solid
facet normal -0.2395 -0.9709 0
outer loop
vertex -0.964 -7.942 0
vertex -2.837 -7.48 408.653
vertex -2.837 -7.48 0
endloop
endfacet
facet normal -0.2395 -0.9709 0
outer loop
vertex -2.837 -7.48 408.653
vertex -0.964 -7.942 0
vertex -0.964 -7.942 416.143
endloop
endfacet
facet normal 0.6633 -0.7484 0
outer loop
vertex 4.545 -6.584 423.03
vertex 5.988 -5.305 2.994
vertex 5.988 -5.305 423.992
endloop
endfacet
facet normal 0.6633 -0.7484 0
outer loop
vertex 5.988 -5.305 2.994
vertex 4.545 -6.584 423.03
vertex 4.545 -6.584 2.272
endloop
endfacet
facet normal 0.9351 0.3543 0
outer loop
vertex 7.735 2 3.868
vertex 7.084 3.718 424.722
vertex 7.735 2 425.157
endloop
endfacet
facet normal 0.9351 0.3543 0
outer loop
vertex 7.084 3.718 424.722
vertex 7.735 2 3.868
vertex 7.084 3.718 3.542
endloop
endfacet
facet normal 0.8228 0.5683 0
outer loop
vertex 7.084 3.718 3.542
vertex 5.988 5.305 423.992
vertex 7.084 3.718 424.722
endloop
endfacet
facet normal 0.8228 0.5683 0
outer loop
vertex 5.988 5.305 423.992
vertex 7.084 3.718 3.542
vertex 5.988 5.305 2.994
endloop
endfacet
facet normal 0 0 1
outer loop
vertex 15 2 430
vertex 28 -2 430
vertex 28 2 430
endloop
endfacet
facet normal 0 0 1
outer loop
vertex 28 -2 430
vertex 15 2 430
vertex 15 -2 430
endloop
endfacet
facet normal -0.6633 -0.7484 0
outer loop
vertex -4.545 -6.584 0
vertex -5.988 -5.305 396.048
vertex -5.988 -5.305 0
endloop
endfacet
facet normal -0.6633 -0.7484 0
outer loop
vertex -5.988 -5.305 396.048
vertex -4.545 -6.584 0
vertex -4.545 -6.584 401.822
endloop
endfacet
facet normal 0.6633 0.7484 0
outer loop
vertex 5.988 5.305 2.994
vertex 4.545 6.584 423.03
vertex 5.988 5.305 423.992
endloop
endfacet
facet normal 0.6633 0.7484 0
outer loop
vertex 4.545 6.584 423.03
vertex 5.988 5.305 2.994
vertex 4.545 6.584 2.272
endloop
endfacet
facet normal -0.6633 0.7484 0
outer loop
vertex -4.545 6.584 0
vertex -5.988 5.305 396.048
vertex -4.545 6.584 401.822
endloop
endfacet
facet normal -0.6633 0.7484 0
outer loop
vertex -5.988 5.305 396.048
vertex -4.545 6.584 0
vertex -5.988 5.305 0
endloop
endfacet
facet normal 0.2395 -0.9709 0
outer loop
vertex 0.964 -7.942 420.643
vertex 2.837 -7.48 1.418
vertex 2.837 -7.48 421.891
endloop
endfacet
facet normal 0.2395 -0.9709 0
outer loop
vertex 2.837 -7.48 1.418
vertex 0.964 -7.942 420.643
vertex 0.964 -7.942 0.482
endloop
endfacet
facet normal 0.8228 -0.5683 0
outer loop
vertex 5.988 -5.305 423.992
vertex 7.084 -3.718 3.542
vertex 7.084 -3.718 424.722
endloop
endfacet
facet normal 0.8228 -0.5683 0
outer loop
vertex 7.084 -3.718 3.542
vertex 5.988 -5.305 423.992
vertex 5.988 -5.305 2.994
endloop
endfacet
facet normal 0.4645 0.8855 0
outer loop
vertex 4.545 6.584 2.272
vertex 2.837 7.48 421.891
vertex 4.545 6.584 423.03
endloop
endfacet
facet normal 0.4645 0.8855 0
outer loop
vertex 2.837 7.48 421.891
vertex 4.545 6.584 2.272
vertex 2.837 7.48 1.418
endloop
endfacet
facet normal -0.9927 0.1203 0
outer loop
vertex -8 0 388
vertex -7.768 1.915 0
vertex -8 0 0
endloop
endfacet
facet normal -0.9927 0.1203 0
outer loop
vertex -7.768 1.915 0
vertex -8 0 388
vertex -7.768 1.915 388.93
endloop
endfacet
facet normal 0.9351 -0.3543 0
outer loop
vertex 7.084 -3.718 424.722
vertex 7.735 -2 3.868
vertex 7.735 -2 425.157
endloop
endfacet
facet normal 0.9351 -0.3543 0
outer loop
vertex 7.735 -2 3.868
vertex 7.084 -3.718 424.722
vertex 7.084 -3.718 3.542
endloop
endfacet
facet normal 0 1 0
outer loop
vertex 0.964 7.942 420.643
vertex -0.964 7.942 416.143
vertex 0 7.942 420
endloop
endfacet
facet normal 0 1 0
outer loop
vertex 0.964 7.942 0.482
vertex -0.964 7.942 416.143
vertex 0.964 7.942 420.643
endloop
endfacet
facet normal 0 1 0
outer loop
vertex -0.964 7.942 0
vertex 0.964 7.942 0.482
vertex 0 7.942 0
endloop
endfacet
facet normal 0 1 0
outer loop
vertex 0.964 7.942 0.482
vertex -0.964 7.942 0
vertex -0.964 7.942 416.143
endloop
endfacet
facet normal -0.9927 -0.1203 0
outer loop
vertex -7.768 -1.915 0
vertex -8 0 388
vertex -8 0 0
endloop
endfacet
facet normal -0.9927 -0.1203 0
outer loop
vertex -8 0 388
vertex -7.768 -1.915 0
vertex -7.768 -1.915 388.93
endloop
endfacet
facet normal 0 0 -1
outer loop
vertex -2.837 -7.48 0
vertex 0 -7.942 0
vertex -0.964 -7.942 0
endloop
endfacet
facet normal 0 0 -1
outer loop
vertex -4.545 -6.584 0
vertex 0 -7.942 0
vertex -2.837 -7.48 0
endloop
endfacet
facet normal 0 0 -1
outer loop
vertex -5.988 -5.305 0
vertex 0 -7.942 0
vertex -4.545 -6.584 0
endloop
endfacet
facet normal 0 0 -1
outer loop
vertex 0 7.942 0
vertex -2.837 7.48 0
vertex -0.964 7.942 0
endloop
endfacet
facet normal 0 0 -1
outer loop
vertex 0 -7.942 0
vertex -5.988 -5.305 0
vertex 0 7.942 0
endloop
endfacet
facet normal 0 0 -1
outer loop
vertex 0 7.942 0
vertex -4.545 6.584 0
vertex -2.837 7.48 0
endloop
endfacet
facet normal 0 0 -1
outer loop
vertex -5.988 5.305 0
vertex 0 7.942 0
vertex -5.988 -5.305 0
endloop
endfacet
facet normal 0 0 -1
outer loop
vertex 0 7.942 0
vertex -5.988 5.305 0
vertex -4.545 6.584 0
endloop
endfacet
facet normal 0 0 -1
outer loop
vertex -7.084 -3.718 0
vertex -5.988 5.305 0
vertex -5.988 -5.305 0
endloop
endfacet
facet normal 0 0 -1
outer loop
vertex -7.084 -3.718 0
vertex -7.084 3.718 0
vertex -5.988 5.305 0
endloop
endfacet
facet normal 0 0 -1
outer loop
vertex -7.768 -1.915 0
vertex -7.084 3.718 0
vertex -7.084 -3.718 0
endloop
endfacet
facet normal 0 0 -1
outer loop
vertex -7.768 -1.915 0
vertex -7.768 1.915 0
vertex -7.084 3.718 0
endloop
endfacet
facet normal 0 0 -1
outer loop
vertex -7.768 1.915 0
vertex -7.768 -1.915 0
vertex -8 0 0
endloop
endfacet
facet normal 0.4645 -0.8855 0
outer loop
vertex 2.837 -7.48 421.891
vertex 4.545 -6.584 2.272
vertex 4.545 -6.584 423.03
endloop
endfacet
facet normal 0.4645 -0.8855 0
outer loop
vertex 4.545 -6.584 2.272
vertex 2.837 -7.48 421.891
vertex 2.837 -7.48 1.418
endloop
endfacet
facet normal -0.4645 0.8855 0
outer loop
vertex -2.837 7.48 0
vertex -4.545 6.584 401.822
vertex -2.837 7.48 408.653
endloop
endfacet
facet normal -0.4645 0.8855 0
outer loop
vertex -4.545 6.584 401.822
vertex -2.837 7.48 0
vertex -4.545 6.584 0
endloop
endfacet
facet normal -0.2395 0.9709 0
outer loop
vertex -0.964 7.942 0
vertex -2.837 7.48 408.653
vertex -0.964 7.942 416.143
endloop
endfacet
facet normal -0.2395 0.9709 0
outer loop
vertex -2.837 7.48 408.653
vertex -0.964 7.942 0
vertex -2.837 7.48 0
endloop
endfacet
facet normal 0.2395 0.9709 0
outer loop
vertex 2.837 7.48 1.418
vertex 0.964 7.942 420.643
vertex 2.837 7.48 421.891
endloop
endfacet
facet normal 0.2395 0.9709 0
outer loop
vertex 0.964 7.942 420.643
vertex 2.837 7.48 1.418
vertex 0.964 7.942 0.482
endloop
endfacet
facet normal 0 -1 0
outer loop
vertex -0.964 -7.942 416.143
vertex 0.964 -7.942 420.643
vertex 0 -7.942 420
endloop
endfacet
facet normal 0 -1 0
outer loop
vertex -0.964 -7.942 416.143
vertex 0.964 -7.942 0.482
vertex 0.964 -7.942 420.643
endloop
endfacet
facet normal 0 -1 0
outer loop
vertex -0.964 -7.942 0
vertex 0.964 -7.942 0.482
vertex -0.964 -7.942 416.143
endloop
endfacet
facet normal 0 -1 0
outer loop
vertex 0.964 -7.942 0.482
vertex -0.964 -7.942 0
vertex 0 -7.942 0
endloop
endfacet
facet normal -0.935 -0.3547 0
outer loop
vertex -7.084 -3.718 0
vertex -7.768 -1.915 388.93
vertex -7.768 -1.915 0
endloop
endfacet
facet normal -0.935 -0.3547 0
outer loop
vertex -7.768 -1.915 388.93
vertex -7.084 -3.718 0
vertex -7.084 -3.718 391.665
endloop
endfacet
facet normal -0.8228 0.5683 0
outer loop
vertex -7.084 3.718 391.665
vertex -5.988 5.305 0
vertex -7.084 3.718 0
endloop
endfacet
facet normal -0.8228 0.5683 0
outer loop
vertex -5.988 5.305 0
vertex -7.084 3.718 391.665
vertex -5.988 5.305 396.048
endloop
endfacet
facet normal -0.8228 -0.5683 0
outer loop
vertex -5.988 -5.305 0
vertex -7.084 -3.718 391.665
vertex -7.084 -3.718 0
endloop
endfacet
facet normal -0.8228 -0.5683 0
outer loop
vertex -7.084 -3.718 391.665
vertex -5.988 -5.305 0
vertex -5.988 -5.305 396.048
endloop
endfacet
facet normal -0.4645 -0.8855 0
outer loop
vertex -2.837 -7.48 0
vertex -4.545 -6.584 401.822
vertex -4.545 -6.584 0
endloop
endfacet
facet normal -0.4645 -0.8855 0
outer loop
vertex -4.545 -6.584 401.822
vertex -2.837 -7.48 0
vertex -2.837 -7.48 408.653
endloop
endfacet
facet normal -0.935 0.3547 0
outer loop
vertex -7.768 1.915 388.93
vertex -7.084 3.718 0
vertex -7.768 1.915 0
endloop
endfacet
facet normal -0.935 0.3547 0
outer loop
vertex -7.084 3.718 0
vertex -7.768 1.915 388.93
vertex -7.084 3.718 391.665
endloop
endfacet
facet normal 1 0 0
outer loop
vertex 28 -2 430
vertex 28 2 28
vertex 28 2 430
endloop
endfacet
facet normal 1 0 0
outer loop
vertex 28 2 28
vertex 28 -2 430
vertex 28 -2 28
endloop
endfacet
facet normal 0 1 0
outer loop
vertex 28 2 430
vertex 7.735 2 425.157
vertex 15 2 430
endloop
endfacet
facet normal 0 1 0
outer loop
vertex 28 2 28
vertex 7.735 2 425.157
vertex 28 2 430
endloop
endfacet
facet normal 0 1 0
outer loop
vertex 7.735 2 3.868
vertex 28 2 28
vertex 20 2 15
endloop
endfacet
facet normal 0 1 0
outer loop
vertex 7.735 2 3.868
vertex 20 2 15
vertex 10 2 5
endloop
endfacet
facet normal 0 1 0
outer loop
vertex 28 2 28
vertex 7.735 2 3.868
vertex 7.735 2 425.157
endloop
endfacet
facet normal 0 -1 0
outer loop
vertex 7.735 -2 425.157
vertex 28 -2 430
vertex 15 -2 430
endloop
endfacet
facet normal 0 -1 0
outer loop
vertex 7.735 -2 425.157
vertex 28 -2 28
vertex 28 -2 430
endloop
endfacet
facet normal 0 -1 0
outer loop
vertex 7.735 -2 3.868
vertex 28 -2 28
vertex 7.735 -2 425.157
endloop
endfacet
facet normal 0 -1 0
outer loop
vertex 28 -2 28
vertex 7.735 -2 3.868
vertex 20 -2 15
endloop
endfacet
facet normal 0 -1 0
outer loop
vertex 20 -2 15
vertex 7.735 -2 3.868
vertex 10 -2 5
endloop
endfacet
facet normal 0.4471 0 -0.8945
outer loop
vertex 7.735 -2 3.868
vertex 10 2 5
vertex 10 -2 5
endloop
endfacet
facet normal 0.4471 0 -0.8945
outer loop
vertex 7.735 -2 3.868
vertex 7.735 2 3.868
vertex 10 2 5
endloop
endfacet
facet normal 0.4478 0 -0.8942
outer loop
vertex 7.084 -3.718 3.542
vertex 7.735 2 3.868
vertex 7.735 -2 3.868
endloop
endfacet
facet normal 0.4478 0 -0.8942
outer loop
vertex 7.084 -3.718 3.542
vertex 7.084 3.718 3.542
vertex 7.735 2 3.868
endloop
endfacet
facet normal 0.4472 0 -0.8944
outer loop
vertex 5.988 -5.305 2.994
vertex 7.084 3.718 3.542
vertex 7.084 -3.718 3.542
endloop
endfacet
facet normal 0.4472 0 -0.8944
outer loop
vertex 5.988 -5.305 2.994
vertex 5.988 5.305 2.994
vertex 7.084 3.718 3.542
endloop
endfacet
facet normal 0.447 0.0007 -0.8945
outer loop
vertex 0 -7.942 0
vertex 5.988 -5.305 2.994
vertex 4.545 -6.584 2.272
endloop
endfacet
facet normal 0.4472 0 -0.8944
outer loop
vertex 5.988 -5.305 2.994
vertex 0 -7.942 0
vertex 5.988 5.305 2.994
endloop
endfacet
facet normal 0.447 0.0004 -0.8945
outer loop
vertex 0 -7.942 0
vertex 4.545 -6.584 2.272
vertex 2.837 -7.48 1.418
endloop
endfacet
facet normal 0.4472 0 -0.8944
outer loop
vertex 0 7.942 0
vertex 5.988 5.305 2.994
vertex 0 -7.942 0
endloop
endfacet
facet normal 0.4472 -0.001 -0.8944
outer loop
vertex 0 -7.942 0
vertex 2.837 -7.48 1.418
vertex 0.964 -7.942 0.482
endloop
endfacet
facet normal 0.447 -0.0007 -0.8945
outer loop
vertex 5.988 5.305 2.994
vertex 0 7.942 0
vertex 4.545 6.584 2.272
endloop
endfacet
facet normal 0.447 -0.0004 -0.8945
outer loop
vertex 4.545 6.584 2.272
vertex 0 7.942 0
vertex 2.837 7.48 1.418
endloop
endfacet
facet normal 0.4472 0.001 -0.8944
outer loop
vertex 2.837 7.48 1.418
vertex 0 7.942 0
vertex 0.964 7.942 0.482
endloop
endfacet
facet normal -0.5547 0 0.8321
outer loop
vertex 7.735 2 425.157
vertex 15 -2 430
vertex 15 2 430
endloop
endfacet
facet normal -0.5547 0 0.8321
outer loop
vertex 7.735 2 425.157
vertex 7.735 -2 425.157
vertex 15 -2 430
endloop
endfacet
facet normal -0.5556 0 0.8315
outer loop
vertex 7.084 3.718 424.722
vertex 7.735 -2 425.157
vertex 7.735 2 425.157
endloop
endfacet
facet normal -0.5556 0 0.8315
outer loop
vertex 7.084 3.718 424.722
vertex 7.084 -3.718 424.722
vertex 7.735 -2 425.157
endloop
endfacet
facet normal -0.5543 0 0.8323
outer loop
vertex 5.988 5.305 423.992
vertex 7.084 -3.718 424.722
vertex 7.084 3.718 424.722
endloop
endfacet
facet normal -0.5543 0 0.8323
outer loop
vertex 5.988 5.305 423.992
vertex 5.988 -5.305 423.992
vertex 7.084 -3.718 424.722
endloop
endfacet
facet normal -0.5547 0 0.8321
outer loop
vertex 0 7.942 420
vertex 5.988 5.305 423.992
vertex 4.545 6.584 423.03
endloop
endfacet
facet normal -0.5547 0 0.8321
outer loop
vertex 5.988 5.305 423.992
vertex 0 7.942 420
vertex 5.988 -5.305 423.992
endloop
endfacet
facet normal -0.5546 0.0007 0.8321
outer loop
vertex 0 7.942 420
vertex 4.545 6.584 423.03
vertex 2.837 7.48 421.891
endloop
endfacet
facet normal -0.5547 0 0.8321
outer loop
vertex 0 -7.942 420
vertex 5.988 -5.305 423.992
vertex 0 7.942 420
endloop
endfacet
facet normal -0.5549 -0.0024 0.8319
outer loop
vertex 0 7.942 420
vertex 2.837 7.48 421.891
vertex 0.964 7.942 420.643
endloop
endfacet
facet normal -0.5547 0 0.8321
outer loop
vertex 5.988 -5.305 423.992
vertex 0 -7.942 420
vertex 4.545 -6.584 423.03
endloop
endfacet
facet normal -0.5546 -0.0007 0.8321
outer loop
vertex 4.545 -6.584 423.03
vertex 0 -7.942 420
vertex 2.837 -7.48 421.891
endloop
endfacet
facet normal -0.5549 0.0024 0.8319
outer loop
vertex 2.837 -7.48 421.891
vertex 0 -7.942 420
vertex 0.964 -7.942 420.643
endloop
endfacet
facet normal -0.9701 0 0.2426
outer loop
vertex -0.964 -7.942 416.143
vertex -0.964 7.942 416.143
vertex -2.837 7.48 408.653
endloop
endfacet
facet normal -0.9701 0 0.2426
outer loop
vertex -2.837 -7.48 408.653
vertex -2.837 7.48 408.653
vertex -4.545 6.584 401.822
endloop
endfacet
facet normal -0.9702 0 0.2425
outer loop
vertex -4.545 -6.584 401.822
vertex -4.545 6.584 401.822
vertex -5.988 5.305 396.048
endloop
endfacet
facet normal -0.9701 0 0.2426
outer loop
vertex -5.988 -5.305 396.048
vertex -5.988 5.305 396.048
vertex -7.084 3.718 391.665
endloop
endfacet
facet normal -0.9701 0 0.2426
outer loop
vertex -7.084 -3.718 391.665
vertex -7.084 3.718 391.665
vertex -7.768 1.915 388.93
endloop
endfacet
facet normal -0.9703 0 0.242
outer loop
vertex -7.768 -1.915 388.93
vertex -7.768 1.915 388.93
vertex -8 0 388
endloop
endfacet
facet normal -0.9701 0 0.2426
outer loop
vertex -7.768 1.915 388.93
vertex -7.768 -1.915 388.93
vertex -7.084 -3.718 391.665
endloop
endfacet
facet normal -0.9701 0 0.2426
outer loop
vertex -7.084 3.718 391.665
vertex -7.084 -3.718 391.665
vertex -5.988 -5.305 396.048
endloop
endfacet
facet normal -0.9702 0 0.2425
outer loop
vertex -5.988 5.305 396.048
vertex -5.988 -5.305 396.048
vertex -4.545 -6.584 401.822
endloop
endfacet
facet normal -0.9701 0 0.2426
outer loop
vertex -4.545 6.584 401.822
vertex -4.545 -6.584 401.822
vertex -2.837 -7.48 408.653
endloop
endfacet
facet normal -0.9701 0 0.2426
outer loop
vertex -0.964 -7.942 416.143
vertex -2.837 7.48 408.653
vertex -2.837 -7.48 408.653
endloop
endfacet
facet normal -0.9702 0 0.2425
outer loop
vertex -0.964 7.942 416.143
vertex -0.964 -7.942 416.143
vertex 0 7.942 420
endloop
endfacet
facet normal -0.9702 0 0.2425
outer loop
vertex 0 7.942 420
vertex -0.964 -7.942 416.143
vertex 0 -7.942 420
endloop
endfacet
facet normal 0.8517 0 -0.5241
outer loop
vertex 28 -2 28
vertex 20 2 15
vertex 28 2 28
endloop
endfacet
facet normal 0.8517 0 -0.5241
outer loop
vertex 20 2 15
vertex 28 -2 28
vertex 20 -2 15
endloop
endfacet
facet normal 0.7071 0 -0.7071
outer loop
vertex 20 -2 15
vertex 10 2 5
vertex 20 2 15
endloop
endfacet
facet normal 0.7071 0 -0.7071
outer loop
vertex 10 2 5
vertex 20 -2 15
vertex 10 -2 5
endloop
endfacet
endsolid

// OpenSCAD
module skate_model()
{
    intersection(){
        union(){
            cylinder(r=8, h=430);
            translate([0,-2])
                cube([28,4,430]);
        }
        union(){
            translate([0,10,0])
            rotate([90,0,0])
            linear_extrude(height=20)
            polygon([
                [-10,0],
                [0,0],
                [10,5],
                [20,15],
                [28,28],
                [28,430],
                [15,430],
                [0,420],
                [-10,380],
            ]);
            
        }
    }
}

skate_model();
